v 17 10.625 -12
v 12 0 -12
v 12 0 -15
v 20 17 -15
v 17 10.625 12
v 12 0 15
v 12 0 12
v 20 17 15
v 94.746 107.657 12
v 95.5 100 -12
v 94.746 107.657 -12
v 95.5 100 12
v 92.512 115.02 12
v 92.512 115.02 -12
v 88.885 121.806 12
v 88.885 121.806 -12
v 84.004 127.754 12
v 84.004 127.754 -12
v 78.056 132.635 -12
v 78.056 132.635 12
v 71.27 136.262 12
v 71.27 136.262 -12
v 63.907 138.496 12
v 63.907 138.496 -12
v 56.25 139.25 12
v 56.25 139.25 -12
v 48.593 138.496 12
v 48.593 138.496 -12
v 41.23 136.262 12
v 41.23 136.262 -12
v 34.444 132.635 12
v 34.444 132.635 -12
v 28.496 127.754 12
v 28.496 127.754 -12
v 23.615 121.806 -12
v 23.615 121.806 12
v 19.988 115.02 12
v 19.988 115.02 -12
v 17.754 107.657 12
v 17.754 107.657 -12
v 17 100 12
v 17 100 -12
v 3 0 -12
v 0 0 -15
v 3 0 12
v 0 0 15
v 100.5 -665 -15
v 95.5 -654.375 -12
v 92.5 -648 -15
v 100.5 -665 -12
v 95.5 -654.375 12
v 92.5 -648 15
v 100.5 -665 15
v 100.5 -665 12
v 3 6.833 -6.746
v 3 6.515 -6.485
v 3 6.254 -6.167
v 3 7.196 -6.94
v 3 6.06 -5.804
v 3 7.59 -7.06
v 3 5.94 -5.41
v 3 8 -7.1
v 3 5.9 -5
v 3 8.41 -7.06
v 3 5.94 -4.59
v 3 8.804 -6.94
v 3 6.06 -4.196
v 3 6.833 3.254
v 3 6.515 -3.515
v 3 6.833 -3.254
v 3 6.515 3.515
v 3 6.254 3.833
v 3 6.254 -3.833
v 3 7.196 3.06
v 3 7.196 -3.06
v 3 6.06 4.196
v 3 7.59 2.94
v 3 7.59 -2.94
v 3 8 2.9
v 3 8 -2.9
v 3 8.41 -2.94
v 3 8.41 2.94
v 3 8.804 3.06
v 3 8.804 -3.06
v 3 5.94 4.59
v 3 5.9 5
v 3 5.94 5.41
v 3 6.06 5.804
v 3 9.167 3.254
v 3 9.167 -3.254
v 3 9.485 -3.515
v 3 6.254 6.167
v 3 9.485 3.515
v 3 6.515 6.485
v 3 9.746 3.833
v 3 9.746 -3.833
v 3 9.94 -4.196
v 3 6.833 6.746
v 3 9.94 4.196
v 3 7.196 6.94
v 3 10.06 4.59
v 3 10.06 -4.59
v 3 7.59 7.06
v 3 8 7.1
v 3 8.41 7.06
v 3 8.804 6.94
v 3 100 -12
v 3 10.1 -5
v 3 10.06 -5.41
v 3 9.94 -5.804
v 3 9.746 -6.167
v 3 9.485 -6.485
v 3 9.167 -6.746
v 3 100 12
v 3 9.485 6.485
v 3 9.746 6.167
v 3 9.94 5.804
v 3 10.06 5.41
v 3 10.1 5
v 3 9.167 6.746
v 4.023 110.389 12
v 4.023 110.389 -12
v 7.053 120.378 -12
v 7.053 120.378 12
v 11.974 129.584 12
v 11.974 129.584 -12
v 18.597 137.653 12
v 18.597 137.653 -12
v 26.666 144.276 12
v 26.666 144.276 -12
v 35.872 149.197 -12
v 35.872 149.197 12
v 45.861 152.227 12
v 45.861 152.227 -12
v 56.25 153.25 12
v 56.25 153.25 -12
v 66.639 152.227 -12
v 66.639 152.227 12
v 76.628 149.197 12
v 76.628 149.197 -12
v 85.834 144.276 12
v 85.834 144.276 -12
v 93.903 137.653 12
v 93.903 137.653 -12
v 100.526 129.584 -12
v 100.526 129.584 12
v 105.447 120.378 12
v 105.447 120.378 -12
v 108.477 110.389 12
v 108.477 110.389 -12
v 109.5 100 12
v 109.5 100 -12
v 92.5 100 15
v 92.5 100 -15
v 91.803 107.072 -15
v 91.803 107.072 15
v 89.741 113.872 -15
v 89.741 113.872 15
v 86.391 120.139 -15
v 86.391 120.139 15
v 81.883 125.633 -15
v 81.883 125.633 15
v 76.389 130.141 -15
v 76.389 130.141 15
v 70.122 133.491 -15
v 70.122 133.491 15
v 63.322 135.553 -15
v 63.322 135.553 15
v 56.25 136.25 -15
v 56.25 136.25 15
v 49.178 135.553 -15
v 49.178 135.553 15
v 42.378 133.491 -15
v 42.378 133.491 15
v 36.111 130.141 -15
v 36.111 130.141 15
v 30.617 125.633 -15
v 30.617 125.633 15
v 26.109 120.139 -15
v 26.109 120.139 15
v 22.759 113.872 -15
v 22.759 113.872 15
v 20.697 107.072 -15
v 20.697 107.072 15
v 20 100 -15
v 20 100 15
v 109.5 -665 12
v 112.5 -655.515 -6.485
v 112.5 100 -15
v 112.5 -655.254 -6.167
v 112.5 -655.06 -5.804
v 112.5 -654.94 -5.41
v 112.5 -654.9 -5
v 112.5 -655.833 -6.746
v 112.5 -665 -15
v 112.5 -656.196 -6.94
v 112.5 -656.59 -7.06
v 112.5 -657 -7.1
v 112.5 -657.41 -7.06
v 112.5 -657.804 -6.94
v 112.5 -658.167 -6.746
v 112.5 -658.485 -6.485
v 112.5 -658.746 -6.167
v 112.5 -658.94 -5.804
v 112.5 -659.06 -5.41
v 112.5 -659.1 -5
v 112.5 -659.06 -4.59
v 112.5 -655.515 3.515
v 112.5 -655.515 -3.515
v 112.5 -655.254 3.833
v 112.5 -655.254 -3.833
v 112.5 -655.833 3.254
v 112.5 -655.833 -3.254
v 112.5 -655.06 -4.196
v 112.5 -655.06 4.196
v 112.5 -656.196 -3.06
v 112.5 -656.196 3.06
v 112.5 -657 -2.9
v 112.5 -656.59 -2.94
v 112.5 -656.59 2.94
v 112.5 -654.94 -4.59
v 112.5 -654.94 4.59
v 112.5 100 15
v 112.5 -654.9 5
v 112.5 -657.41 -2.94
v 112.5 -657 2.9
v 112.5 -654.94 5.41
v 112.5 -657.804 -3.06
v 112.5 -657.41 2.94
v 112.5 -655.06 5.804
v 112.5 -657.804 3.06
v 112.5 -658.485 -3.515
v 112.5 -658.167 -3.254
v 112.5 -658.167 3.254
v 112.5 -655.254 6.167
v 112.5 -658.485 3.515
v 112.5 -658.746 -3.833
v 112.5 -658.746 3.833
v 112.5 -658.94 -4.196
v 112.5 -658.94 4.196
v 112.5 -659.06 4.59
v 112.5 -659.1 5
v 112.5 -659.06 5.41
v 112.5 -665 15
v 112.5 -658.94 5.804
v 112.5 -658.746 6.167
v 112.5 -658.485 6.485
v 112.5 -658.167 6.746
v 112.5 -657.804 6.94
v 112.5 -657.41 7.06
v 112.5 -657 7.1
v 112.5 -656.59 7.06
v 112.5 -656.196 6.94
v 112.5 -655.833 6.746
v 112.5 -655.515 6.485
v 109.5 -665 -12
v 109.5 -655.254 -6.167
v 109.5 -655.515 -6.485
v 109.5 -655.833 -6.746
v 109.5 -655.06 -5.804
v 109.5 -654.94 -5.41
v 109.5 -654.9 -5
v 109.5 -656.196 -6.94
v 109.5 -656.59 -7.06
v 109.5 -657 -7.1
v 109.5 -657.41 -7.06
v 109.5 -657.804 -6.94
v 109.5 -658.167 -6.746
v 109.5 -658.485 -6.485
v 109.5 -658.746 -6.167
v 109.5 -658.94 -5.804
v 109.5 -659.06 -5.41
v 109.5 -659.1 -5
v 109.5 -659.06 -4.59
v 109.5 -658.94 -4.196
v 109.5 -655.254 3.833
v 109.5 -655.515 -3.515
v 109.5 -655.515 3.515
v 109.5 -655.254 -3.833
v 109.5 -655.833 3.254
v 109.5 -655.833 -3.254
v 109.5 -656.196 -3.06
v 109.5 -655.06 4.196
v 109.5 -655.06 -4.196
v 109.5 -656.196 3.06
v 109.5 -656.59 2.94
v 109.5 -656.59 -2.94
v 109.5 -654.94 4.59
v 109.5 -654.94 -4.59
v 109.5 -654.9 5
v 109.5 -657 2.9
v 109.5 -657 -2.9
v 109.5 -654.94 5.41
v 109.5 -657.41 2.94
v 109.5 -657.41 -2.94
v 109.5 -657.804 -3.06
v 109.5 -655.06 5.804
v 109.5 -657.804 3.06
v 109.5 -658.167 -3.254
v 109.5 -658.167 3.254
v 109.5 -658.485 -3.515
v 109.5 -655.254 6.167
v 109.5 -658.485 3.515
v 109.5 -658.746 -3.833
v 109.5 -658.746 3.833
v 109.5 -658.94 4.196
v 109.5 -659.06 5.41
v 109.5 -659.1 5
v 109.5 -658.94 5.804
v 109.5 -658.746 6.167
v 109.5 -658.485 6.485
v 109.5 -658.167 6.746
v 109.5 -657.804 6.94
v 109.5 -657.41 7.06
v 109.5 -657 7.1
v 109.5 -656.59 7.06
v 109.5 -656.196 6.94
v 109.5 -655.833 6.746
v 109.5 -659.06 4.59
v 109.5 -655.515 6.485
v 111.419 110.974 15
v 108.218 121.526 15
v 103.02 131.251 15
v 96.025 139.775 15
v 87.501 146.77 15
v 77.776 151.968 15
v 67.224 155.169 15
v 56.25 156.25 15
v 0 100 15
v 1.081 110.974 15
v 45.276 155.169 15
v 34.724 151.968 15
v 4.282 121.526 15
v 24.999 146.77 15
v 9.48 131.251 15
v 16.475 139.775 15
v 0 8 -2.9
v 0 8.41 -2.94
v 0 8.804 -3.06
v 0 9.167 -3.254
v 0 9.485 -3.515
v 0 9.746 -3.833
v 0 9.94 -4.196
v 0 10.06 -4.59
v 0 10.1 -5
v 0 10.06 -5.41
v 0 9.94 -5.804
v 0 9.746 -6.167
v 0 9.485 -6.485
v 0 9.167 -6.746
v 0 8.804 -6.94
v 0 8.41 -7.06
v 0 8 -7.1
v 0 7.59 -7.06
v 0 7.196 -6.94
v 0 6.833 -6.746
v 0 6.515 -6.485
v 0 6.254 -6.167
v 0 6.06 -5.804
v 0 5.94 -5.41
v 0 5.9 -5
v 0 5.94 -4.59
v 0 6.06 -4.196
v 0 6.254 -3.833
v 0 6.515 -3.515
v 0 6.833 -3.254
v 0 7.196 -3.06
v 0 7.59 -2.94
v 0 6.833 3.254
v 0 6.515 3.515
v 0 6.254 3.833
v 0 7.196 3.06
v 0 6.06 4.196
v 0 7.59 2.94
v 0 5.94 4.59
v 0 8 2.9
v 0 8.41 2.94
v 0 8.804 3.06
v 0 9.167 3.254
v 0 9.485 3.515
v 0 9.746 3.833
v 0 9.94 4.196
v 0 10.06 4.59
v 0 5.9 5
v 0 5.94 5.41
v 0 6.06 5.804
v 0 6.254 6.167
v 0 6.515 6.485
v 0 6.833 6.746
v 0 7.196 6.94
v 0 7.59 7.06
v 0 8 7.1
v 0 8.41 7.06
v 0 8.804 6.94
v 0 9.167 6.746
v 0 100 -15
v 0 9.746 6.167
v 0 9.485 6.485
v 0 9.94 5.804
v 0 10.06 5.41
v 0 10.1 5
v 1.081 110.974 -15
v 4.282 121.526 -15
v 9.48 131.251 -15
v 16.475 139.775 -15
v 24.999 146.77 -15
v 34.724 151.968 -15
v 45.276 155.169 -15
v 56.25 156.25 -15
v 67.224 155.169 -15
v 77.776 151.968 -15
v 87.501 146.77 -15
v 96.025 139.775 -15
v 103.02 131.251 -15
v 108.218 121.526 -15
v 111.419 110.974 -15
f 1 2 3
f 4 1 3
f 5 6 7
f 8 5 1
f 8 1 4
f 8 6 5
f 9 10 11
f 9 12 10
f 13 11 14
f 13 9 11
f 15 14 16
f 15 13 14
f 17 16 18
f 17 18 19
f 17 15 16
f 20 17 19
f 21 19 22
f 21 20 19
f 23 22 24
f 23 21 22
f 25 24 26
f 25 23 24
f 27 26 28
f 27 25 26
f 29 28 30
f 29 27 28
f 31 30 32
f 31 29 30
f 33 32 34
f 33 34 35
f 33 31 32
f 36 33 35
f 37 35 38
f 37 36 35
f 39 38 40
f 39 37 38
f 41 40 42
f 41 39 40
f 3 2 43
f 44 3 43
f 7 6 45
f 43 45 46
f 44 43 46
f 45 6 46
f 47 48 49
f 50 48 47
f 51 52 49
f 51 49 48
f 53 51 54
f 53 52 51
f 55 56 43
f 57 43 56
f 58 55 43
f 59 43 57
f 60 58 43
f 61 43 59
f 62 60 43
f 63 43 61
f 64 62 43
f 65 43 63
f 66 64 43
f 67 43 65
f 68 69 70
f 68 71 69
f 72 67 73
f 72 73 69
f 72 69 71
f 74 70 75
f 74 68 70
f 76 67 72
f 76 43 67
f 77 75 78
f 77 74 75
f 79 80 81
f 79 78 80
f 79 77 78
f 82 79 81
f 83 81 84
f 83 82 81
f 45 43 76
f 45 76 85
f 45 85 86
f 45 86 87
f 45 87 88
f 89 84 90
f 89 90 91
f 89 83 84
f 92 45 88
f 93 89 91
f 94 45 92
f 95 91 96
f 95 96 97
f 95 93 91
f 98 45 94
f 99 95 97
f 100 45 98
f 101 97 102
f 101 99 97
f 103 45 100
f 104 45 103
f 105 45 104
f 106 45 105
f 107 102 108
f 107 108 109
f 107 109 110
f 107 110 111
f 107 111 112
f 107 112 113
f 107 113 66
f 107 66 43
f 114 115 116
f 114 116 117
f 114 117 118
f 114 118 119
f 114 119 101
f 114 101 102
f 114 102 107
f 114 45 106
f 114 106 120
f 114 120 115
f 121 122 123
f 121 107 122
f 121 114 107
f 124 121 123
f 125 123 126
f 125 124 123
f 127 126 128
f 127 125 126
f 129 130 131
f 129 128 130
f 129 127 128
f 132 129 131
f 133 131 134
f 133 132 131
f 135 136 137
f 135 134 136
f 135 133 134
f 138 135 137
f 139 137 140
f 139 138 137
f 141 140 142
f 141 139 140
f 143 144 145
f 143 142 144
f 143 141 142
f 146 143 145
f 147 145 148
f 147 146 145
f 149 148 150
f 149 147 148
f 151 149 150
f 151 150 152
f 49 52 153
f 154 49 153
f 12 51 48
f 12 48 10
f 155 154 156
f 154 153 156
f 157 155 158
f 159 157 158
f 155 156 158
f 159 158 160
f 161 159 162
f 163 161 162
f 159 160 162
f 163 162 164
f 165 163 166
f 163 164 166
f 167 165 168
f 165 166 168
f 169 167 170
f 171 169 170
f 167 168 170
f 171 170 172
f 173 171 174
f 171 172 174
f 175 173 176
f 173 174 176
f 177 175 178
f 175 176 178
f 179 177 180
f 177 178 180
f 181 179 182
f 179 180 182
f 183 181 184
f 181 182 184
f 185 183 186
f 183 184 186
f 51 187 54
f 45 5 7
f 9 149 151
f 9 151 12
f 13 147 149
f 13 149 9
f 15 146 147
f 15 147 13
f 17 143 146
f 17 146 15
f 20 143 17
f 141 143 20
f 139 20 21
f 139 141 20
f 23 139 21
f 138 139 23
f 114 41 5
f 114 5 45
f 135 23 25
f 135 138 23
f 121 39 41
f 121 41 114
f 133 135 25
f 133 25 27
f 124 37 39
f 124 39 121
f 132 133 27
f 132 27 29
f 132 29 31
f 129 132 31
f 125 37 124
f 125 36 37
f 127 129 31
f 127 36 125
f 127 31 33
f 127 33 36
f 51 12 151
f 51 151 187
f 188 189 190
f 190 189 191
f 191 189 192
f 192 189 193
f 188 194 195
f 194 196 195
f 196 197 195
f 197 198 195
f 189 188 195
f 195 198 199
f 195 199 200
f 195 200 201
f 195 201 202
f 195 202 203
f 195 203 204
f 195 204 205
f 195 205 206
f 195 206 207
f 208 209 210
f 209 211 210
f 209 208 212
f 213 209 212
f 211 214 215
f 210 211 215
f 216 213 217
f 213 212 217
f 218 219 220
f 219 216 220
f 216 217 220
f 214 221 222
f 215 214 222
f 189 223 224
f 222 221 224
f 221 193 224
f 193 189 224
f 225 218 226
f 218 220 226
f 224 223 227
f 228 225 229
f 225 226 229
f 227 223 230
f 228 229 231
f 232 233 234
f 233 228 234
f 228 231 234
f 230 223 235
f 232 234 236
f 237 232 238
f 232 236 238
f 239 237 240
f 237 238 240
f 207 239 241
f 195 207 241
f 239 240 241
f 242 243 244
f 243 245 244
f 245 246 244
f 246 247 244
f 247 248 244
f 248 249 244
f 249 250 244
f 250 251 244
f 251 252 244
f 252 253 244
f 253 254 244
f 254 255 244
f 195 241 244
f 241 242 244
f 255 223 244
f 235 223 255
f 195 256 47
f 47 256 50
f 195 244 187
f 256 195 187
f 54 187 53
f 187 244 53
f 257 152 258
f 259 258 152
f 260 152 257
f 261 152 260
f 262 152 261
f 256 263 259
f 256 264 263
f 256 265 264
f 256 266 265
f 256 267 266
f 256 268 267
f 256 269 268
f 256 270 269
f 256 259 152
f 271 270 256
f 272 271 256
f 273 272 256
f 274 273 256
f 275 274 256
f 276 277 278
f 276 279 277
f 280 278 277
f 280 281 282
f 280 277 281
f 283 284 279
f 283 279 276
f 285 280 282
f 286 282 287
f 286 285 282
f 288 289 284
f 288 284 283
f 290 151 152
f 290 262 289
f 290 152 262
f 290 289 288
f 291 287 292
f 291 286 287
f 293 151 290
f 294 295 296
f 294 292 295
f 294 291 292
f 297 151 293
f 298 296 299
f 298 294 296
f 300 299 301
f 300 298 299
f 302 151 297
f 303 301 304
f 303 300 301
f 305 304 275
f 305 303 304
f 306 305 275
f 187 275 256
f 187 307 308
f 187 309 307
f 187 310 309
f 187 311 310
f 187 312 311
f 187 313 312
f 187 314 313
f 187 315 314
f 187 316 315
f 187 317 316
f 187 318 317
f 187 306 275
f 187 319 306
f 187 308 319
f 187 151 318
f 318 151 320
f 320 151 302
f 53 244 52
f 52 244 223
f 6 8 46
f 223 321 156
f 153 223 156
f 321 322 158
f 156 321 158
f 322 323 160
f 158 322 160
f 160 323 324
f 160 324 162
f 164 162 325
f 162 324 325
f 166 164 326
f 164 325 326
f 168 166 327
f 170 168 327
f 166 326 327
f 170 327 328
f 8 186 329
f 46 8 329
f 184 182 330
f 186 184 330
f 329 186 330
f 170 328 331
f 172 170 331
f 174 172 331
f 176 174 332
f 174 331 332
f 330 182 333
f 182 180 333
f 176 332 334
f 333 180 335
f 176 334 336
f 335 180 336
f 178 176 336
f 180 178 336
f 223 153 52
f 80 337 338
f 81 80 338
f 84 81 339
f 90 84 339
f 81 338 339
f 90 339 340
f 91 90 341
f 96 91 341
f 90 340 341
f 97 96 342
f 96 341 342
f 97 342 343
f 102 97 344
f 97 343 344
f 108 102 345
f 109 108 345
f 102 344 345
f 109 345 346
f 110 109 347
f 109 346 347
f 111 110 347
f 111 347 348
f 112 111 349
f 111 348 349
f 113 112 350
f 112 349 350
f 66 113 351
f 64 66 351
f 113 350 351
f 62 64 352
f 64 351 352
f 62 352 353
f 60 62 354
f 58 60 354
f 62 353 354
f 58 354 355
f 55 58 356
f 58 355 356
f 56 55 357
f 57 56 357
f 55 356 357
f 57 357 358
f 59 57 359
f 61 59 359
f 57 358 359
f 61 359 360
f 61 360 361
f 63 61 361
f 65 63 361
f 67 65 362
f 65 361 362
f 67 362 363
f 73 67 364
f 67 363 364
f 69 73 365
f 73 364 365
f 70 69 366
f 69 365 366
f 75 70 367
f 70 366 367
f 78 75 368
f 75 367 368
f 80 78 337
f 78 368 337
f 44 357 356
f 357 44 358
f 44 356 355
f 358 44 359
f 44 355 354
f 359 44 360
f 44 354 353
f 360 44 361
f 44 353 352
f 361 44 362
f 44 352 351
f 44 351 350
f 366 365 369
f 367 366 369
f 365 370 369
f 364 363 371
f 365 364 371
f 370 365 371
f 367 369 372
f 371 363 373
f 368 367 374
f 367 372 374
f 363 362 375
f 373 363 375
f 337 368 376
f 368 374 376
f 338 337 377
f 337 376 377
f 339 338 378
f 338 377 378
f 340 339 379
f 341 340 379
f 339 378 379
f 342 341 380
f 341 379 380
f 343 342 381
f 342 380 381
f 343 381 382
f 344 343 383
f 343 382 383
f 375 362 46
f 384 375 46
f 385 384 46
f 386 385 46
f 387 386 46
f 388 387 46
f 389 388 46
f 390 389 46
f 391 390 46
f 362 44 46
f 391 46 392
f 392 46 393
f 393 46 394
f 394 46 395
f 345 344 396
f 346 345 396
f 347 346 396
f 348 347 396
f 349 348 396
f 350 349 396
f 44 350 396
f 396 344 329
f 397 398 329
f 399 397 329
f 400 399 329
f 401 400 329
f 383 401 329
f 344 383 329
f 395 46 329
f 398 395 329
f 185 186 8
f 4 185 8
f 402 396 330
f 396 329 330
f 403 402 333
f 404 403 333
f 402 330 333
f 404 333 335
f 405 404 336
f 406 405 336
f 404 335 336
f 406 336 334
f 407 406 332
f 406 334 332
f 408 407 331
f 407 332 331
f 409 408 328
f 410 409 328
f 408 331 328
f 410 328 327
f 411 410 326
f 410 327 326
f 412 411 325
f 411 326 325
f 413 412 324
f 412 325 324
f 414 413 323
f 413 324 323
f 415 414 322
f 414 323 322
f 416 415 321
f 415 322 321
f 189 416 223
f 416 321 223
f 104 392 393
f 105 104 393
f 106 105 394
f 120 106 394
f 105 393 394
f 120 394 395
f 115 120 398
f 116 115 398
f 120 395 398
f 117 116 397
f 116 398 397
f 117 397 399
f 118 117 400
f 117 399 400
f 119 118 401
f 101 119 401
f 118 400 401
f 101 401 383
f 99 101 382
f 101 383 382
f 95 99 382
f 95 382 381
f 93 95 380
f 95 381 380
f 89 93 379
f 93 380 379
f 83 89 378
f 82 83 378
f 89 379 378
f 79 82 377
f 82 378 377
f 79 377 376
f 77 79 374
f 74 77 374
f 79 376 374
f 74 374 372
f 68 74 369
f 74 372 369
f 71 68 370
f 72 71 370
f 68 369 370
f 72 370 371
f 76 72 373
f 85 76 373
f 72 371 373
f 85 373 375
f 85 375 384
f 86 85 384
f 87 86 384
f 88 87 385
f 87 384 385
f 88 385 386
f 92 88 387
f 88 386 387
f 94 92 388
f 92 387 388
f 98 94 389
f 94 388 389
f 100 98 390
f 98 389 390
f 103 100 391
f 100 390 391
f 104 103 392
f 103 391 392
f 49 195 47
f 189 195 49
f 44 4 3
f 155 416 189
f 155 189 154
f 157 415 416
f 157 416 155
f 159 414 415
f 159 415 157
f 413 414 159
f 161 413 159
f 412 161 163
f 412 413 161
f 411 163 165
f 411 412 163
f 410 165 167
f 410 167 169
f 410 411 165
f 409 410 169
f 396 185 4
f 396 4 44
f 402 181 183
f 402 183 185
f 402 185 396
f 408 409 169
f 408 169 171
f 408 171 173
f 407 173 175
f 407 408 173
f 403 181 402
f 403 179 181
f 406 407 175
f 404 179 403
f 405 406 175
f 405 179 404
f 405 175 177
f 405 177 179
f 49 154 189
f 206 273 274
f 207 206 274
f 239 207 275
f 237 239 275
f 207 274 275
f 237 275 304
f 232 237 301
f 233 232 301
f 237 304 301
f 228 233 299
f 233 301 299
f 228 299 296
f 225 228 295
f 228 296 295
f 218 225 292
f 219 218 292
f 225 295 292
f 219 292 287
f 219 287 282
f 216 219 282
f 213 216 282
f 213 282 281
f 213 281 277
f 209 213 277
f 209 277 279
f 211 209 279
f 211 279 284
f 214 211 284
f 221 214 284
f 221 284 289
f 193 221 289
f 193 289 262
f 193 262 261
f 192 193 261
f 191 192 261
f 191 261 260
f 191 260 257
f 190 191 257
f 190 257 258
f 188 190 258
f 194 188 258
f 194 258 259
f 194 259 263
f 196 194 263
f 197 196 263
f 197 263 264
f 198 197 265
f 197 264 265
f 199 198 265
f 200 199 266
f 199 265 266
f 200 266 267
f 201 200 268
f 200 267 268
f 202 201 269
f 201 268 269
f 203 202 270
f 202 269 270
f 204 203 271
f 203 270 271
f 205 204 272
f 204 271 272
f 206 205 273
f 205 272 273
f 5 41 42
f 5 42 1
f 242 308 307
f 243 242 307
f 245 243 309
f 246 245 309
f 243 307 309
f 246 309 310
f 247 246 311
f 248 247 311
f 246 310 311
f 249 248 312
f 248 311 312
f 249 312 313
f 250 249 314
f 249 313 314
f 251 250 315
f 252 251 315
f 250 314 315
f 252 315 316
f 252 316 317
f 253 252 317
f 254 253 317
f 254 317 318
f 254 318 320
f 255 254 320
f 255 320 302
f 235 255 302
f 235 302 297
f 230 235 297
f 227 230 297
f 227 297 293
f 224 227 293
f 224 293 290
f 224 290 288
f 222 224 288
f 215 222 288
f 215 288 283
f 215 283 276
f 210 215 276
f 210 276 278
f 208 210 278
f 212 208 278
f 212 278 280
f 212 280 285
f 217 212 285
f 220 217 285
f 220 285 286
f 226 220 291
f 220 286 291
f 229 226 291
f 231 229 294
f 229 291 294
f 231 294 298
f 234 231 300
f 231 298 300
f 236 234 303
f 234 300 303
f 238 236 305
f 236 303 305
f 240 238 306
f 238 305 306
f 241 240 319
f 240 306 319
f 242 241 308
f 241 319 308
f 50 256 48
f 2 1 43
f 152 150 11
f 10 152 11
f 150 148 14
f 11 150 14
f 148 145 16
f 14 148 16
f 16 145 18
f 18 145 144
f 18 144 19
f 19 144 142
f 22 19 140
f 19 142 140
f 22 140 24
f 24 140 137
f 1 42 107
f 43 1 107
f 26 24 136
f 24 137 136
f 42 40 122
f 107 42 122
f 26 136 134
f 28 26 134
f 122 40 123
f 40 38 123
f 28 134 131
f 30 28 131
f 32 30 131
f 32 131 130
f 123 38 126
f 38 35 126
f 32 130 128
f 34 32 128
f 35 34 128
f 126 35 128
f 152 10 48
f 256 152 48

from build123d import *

# Parameters (mm, degrees)
EXTRUDE_1_DEPTH     = 15
SHELL_1_T           = -3
CUT_EXTRUDE_1_DEPTH = 676.11573082
SKETCH_4_R          = 2.1
CUT_EXTRUDE_2_DEPTH = 675.121836169
SKETCH_5_R          = 2.1
CUT_EXTRUDE_3_DEPTH = 3


with BuildPart() as part:
    # 草图1 → 凸台-拉伸1 (new, symmetric)
    with BuildSketch(Plane.XY):
        with BuildLine():
            Line((0, 0), (0, 100))
            ThreePointArc((0, 100), (56.25, 156.25), (112.5, 100))
            Line((112.5, 100), (112.5, -665))
            Line((112.5, -665), (92.5, -665))
            Line((92.5, -665), (92.5, 100))
            ThreePointArc((92.5, 100), (56.25, 136.25), (20, 100))
            Line((20, 100), (20, 0))
            Line((20, 0), (0, 0))
        make_face()
    extrude(amount=EXTRUDE_1_DEPTH, both=True)

    # 抽壳1
    shell_1_openings = [part.faces().sort_by_distance(p)[0] for p in [
        (102.5, -665, 0),
        (10, 0, 0),
    ]]
    offset(amount=SHELL_1_T, openings=shell_1_openings, kind=Kind.INTERSECTION)

    # 草图3 → 切除-拉伸1 (cut, through all)
    with BuildSketch(Plane.XY.offset(15)):
        Polygon((12, 0), (20, 17), (20, 0), align=None)
        Polygon((92.5, -665), (92.5, -648), (100.5, -665), align=None)
    extrude(amount=-CUT_EXTRUDE_1_DEPTH, mode=Mode.SUBTRACT)

    # 草图4 → 切除-拉伸2 (cut, through all)
    with BuildSketch(Plane.ZY.offset(-109.5)):
        with Locations(Location((-5, -657, 0), (0, 0, 270))):
            Circle(SKETCH_4_R)
        with Locations(Location((5, -657, 0), (0, 0, 270))):
            Circle(SKETCH_4_R)
    extrude(amount=-CUT_EXTRUDE_2_DEPTH, mode=Mode.SUBTRACT)

    # 草图5 → 切除-拉伸3 (cut)
    with BuildSketch(Plane.ZY):
        with Locations((-5, 8)):
            Circle(SKETCH_5_R)
        with Locations((5, 8)):
            Circle(SKETCH_5_R)
    extrude(amount=-CUT_EXTRUDE_3_DEPTH, mode=Mode.SUBTRACT)


solid = part.part
